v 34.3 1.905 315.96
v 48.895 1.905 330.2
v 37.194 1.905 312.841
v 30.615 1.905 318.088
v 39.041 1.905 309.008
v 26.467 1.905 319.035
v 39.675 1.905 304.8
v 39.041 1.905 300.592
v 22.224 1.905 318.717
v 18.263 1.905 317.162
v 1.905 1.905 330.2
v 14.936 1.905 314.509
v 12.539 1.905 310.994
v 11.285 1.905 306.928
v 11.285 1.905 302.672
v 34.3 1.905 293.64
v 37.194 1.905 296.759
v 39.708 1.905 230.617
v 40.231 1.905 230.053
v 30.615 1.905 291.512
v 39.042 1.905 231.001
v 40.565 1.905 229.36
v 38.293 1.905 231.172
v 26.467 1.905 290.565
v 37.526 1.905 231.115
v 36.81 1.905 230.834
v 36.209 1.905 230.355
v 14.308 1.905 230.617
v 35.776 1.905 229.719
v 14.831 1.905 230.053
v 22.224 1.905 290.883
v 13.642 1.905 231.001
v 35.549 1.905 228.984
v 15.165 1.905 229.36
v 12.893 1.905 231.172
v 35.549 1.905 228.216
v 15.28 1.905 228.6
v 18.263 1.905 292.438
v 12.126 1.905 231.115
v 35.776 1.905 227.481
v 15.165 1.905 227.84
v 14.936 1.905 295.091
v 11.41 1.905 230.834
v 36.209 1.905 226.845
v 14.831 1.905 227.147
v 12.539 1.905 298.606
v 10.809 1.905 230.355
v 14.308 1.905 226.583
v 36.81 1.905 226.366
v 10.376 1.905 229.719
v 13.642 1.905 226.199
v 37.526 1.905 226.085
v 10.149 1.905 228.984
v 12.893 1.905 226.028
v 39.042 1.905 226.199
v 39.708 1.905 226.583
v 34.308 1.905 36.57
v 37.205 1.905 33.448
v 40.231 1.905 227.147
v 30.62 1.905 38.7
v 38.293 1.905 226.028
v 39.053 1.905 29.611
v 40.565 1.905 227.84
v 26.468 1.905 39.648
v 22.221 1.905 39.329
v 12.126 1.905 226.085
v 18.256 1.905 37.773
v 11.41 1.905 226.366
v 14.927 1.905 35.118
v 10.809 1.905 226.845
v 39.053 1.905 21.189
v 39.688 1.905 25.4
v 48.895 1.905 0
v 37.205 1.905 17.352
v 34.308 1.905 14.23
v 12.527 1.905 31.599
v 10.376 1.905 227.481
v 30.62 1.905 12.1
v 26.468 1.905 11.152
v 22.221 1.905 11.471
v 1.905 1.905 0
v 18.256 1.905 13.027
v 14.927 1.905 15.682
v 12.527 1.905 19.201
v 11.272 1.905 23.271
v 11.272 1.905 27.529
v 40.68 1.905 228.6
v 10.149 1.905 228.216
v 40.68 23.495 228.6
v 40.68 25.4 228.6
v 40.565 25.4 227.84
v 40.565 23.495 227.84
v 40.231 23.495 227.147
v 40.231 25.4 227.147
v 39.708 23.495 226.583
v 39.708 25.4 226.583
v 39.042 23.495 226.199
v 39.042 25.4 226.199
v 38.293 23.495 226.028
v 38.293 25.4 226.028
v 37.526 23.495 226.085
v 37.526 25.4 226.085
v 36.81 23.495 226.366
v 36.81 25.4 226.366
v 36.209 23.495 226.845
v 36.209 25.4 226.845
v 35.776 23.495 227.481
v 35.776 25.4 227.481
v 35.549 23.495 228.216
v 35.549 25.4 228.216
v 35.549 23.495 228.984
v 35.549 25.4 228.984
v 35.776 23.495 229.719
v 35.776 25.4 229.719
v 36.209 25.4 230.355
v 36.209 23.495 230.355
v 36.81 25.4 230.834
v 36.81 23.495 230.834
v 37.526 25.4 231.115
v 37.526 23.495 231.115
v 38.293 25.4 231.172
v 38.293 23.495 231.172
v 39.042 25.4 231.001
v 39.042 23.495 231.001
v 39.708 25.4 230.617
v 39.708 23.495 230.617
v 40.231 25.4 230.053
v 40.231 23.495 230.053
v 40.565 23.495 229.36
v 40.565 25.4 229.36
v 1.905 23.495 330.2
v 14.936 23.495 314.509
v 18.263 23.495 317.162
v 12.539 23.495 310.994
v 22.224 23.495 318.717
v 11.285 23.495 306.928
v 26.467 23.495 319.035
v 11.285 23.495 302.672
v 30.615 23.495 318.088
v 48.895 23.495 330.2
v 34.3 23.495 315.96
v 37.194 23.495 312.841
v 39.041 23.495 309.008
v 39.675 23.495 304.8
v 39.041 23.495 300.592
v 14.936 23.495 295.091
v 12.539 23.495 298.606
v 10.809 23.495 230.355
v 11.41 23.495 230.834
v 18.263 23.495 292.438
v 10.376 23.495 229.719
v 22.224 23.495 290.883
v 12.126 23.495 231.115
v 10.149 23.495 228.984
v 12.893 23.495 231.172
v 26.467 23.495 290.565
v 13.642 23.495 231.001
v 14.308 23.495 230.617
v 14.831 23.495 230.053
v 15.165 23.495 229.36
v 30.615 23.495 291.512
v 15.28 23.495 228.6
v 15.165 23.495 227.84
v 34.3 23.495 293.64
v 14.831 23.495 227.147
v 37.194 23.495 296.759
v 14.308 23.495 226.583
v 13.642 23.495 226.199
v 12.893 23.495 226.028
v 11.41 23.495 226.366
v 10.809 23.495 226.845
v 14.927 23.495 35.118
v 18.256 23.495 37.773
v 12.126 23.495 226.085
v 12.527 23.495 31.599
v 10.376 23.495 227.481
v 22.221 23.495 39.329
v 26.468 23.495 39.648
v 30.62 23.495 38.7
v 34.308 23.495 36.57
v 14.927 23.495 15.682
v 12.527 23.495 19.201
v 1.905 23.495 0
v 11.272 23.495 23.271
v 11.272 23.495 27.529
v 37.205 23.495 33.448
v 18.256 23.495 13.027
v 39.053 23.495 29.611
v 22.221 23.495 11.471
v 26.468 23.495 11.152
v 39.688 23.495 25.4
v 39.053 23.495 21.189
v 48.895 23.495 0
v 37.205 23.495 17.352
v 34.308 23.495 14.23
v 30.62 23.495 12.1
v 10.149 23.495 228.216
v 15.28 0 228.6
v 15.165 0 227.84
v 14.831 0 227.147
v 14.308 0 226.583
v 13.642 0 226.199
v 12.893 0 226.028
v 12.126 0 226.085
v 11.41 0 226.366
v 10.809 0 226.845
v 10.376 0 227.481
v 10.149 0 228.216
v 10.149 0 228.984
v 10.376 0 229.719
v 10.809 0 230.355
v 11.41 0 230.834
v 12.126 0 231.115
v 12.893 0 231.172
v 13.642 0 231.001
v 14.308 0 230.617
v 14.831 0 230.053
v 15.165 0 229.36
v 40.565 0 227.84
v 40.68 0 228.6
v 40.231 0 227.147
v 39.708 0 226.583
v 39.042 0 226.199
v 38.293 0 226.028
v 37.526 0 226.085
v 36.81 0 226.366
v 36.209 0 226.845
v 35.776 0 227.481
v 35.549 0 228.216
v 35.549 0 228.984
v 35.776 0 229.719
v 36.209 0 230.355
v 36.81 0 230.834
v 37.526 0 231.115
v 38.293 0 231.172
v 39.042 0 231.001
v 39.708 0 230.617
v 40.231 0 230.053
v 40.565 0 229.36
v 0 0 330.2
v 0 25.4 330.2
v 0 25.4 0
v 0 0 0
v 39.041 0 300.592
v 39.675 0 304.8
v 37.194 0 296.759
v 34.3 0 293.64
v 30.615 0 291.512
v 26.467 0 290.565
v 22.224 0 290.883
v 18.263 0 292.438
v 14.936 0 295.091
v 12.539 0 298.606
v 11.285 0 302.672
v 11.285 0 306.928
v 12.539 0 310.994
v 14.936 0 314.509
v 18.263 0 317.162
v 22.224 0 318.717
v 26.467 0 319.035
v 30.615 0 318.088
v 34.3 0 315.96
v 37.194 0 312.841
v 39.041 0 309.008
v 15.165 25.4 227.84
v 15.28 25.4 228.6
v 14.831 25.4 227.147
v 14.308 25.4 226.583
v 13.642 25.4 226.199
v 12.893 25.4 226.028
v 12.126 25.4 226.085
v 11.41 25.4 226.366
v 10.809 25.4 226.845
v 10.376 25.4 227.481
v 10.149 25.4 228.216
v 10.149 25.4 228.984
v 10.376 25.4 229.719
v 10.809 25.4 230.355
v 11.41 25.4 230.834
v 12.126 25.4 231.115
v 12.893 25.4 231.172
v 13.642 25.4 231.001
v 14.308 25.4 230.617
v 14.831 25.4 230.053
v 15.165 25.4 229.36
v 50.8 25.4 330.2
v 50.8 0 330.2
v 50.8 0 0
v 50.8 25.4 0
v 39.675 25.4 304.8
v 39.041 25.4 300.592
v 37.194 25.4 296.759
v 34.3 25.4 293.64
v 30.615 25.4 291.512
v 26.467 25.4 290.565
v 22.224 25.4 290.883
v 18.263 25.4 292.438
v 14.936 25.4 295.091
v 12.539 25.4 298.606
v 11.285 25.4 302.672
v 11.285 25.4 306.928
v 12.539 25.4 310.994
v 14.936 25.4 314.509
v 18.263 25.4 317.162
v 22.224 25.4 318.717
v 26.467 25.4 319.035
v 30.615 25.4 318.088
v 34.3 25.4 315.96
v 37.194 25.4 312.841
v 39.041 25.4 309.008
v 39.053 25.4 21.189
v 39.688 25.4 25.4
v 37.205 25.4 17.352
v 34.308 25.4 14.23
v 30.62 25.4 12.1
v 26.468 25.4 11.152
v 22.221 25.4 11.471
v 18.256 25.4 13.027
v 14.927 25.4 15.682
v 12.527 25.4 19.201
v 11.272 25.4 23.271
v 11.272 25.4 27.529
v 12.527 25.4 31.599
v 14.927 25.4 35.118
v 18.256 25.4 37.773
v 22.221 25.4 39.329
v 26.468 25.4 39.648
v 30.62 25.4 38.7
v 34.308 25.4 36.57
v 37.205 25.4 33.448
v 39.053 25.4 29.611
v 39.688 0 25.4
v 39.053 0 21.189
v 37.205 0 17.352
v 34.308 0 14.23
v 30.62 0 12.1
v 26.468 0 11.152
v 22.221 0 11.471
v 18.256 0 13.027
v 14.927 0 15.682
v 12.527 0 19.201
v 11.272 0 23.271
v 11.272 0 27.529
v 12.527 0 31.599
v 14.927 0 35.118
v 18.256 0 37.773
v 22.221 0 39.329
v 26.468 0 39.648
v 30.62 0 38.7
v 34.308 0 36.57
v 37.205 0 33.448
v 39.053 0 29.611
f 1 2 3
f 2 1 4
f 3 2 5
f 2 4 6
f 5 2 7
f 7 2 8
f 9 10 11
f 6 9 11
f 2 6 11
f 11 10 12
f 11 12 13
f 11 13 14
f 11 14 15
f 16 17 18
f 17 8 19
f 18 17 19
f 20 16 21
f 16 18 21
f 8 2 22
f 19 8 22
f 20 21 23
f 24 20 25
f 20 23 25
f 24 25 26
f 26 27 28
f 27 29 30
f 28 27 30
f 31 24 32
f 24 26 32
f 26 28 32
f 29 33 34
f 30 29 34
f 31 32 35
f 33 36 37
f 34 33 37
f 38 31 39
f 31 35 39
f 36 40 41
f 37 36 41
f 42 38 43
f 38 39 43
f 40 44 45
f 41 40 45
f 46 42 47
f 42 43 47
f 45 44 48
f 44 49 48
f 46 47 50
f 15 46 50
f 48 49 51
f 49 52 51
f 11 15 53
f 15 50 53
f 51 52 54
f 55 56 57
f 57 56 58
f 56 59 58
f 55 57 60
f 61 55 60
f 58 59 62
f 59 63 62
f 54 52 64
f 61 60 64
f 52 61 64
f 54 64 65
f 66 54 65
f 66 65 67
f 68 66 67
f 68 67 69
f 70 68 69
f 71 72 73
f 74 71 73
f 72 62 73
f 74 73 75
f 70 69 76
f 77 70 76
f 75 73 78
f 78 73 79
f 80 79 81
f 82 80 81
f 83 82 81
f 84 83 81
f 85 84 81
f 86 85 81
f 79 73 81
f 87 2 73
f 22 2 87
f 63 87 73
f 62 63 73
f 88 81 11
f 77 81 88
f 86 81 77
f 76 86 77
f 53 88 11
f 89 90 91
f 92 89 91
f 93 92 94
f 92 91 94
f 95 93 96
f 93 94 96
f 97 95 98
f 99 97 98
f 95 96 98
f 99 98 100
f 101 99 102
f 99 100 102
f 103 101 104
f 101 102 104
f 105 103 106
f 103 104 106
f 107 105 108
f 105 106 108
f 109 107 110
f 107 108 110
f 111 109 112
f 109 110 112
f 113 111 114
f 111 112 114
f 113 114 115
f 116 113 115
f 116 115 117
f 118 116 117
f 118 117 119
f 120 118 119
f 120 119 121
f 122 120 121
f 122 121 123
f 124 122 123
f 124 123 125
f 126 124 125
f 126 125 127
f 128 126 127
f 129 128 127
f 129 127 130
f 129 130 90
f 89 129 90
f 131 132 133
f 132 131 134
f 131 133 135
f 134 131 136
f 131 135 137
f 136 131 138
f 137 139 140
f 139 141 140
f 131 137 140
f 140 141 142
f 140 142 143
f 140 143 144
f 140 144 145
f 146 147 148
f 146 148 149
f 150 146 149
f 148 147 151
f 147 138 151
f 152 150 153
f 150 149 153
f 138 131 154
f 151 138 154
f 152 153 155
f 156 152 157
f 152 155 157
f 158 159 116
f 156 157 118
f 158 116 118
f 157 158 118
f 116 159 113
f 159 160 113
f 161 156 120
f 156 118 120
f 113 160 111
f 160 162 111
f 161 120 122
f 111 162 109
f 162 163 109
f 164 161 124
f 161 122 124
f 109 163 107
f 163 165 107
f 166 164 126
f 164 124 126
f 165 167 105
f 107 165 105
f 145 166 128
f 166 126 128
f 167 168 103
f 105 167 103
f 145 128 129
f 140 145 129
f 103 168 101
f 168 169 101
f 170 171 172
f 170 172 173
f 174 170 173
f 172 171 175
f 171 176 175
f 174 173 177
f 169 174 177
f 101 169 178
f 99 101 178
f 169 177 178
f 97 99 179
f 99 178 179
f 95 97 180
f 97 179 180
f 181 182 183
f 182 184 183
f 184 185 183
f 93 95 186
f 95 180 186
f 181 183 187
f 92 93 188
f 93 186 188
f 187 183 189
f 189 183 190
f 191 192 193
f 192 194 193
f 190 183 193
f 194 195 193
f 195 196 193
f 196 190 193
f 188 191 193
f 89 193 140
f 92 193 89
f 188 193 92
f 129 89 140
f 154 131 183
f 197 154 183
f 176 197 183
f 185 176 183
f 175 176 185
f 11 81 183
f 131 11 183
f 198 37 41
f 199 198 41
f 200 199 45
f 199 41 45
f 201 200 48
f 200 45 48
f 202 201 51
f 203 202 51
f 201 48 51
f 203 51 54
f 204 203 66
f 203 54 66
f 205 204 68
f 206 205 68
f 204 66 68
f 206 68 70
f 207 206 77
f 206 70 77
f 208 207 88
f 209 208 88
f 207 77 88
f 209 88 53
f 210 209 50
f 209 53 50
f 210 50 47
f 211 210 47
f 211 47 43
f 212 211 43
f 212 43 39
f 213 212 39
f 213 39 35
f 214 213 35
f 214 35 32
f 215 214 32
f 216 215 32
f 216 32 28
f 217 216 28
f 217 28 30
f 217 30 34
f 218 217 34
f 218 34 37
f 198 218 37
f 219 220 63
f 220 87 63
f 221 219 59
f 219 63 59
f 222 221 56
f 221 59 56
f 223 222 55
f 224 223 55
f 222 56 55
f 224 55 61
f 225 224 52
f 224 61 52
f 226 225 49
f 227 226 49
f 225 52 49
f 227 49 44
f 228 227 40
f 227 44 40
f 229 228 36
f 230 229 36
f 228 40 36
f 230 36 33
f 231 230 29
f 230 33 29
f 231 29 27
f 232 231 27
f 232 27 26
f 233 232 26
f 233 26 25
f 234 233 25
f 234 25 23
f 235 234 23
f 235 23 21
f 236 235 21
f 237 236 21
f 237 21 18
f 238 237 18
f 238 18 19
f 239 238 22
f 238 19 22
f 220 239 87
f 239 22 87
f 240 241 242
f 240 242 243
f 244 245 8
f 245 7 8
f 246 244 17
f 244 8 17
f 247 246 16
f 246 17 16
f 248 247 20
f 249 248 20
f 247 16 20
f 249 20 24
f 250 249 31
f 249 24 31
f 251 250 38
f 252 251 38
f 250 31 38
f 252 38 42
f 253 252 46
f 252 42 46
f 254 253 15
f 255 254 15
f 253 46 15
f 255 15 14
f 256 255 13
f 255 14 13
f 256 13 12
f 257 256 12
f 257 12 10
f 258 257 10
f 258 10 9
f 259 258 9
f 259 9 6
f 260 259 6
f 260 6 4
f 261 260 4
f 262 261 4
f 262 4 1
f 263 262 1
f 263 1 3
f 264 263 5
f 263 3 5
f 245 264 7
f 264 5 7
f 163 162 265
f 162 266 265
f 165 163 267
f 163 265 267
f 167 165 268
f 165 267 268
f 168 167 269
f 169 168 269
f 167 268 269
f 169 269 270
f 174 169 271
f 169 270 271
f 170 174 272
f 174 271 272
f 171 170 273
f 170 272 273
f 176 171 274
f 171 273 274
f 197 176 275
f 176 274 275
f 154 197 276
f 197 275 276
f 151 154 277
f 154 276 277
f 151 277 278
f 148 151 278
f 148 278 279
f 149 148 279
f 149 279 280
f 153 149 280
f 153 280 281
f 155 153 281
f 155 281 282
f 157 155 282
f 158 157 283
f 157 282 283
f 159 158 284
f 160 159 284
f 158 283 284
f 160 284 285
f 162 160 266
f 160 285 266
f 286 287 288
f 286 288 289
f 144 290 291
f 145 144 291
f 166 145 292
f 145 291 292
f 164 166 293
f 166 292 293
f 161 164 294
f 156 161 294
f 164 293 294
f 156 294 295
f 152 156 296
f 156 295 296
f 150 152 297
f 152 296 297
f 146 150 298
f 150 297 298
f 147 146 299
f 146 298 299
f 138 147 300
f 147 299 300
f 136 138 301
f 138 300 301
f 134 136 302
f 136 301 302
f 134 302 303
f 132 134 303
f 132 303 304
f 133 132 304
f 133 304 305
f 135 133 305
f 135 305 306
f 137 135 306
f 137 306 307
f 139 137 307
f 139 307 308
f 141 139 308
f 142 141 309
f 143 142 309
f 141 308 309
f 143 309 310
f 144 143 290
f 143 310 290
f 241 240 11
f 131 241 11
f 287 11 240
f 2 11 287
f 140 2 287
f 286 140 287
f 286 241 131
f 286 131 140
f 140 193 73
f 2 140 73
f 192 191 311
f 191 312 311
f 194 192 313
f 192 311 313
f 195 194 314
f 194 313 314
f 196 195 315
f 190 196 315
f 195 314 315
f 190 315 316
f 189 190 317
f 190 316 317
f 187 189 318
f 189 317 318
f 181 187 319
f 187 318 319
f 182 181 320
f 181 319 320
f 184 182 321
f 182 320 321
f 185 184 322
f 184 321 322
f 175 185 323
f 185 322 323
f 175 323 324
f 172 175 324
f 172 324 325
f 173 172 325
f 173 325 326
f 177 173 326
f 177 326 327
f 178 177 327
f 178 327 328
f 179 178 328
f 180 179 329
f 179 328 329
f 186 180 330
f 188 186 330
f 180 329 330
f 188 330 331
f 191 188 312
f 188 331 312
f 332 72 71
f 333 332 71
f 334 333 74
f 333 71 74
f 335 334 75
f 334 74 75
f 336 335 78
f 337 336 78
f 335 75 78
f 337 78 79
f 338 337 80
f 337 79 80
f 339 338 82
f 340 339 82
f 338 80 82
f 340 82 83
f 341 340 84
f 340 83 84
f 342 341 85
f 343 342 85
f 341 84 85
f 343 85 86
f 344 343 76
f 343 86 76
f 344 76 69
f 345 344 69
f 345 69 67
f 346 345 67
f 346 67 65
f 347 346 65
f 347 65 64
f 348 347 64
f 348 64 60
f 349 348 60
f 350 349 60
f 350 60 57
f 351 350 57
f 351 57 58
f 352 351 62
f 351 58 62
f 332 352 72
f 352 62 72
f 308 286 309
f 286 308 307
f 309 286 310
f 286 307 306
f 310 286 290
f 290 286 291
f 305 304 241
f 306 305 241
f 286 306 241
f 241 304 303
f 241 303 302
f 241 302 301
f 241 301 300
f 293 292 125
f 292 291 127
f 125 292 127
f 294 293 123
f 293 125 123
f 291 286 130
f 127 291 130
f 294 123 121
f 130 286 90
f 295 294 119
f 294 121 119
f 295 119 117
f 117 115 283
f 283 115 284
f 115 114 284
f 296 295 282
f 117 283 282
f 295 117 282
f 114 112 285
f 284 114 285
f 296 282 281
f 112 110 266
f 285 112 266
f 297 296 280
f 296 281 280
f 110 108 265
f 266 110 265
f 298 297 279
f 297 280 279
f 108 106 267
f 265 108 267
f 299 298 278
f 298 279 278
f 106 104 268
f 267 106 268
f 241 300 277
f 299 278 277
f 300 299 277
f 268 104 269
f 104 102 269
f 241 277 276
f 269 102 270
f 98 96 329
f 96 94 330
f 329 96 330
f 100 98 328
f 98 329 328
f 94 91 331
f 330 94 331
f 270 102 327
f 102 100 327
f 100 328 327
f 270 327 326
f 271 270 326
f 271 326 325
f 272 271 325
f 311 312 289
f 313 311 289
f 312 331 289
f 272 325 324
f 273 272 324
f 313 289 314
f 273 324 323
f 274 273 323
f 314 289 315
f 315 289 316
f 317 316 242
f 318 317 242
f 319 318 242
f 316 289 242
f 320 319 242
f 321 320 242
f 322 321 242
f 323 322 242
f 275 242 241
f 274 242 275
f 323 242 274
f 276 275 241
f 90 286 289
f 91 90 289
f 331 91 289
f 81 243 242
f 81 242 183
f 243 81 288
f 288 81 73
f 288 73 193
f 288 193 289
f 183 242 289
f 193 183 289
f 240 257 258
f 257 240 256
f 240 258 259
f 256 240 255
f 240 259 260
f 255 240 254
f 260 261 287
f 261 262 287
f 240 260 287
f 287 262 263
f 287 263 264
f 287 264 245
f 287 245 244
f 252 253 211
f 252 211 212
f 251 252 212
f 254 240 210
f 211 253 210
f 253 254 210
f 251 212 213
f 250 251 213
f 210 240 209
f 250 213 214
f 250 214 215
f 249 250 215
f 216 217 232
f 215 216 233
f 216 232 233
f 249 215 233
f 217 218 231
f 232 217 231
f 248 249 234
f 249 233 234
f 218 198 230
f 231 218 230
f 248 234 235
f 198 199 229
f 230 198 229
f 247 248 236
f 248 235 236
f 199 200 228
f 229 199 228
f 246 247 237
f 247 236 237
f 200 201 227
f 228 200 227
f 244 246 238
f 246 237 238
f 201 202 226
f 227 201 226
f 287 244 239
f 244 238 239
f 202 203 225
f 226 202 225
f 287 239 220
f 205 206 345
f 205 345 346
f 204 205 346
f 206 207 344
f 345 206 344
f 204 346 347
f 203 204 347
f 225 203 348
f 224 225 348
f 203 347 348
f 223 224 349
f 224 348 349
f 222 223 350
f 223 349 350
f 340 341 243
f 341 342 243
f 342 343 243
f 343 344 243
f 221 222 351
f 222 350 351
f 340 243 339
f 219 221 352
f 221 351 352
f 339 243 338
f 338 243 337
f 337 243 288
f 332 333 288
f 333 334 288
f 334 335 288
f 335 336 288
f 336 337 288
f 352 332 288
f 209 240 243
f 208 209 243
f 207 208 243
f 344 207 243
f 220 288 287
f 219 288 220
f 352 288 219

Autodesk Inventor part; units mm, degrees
ref_plane "YZ Plane" through (0, 0, 0) normal (1, 0, 0) x (0, 1, 0)
ref_plane "XZ Plane" through (0, 0, 0) normal (0, 1, 0) x (-1, 0, 0)
ref_plane "XY Plane" through (0, 0, 0) normal (0, 0, 1) x (1, 0, 0)
sketch "Sketch1" plane through (0, 0, 0) normal (0, 0, 1) x (1, 0, 0)
  line L0 (0, 0) -> (50.8, 0)
  line L1 (50.8, 0) -> (50.8, 25.4)
  line L2 (50.8, 25.4) -> (0, 25.4)
  line L3 (0, 25.4) -> (0, 0)
  line L4 (1.905, 23.495) -> (48.895, 23.495)
  line L5 (48.895, 23.495) -> (48.895, 1.905)
  line L6 (48.895, 1.905) -> (1.905, 1.905)
  line L7 (1.905, 1.905) -> (1.905, 23.495)
  dimension "d0" = 50.8
  dimension "d1" = 25.4
  dimension "d2" = 1.905
extrude "Extrusion1" add sketch "Sketch1" along normal blind 330.2
sketch "Sketch2" plane through (0, 25.4, 0) normal (0, 1, 0) x (1, 0, 0)
  line L0 (1.905, -330.2) -> (48.895, -330.2) construction
  line L1 (25.4, -330.2) -> (25.4, -304.8) construction
  line L2 (25.4, -304.8) -> (25.4, -228.6) construction
  line L3 (50.8, 0) -> (0, 0) construction
  line L4 (25.4, 0) -> (25.4, -25.4) construction
  circle A0 centre (25.4, -304.8) radius 14.2748
  circle A1 centre (25.4, -25.4) radius 14.2875
  line L5 (25.4, -228.6) -> (12.7, -228.6) construction
  line L6 (12.7, -228.6) -> (25.4, -228.6) construction
  line L7 (25.4, -228.6) -> (38.1, -228.6) construction
  circle A2 centre (12.7, -228.6) radius 2.5797
  circle A3 centre (38.1, -228.6) radius 2.5797
  dimension "d5" = 25.4
  dimension "d6" = 76.2
  dimension "d7" = 25.4
  dimension "d8" = 28.5496
  dimension "d9" = 28.575
  dimension "d10" = 12.7
  dimension "d11" = 12.7
  dimension "d12" = 5.1594
  dimension "d13" = 5.1594
extrude "Extrusion2" cut sketch "Sketch2" against normal blind 355.6
properties part number "arm"
